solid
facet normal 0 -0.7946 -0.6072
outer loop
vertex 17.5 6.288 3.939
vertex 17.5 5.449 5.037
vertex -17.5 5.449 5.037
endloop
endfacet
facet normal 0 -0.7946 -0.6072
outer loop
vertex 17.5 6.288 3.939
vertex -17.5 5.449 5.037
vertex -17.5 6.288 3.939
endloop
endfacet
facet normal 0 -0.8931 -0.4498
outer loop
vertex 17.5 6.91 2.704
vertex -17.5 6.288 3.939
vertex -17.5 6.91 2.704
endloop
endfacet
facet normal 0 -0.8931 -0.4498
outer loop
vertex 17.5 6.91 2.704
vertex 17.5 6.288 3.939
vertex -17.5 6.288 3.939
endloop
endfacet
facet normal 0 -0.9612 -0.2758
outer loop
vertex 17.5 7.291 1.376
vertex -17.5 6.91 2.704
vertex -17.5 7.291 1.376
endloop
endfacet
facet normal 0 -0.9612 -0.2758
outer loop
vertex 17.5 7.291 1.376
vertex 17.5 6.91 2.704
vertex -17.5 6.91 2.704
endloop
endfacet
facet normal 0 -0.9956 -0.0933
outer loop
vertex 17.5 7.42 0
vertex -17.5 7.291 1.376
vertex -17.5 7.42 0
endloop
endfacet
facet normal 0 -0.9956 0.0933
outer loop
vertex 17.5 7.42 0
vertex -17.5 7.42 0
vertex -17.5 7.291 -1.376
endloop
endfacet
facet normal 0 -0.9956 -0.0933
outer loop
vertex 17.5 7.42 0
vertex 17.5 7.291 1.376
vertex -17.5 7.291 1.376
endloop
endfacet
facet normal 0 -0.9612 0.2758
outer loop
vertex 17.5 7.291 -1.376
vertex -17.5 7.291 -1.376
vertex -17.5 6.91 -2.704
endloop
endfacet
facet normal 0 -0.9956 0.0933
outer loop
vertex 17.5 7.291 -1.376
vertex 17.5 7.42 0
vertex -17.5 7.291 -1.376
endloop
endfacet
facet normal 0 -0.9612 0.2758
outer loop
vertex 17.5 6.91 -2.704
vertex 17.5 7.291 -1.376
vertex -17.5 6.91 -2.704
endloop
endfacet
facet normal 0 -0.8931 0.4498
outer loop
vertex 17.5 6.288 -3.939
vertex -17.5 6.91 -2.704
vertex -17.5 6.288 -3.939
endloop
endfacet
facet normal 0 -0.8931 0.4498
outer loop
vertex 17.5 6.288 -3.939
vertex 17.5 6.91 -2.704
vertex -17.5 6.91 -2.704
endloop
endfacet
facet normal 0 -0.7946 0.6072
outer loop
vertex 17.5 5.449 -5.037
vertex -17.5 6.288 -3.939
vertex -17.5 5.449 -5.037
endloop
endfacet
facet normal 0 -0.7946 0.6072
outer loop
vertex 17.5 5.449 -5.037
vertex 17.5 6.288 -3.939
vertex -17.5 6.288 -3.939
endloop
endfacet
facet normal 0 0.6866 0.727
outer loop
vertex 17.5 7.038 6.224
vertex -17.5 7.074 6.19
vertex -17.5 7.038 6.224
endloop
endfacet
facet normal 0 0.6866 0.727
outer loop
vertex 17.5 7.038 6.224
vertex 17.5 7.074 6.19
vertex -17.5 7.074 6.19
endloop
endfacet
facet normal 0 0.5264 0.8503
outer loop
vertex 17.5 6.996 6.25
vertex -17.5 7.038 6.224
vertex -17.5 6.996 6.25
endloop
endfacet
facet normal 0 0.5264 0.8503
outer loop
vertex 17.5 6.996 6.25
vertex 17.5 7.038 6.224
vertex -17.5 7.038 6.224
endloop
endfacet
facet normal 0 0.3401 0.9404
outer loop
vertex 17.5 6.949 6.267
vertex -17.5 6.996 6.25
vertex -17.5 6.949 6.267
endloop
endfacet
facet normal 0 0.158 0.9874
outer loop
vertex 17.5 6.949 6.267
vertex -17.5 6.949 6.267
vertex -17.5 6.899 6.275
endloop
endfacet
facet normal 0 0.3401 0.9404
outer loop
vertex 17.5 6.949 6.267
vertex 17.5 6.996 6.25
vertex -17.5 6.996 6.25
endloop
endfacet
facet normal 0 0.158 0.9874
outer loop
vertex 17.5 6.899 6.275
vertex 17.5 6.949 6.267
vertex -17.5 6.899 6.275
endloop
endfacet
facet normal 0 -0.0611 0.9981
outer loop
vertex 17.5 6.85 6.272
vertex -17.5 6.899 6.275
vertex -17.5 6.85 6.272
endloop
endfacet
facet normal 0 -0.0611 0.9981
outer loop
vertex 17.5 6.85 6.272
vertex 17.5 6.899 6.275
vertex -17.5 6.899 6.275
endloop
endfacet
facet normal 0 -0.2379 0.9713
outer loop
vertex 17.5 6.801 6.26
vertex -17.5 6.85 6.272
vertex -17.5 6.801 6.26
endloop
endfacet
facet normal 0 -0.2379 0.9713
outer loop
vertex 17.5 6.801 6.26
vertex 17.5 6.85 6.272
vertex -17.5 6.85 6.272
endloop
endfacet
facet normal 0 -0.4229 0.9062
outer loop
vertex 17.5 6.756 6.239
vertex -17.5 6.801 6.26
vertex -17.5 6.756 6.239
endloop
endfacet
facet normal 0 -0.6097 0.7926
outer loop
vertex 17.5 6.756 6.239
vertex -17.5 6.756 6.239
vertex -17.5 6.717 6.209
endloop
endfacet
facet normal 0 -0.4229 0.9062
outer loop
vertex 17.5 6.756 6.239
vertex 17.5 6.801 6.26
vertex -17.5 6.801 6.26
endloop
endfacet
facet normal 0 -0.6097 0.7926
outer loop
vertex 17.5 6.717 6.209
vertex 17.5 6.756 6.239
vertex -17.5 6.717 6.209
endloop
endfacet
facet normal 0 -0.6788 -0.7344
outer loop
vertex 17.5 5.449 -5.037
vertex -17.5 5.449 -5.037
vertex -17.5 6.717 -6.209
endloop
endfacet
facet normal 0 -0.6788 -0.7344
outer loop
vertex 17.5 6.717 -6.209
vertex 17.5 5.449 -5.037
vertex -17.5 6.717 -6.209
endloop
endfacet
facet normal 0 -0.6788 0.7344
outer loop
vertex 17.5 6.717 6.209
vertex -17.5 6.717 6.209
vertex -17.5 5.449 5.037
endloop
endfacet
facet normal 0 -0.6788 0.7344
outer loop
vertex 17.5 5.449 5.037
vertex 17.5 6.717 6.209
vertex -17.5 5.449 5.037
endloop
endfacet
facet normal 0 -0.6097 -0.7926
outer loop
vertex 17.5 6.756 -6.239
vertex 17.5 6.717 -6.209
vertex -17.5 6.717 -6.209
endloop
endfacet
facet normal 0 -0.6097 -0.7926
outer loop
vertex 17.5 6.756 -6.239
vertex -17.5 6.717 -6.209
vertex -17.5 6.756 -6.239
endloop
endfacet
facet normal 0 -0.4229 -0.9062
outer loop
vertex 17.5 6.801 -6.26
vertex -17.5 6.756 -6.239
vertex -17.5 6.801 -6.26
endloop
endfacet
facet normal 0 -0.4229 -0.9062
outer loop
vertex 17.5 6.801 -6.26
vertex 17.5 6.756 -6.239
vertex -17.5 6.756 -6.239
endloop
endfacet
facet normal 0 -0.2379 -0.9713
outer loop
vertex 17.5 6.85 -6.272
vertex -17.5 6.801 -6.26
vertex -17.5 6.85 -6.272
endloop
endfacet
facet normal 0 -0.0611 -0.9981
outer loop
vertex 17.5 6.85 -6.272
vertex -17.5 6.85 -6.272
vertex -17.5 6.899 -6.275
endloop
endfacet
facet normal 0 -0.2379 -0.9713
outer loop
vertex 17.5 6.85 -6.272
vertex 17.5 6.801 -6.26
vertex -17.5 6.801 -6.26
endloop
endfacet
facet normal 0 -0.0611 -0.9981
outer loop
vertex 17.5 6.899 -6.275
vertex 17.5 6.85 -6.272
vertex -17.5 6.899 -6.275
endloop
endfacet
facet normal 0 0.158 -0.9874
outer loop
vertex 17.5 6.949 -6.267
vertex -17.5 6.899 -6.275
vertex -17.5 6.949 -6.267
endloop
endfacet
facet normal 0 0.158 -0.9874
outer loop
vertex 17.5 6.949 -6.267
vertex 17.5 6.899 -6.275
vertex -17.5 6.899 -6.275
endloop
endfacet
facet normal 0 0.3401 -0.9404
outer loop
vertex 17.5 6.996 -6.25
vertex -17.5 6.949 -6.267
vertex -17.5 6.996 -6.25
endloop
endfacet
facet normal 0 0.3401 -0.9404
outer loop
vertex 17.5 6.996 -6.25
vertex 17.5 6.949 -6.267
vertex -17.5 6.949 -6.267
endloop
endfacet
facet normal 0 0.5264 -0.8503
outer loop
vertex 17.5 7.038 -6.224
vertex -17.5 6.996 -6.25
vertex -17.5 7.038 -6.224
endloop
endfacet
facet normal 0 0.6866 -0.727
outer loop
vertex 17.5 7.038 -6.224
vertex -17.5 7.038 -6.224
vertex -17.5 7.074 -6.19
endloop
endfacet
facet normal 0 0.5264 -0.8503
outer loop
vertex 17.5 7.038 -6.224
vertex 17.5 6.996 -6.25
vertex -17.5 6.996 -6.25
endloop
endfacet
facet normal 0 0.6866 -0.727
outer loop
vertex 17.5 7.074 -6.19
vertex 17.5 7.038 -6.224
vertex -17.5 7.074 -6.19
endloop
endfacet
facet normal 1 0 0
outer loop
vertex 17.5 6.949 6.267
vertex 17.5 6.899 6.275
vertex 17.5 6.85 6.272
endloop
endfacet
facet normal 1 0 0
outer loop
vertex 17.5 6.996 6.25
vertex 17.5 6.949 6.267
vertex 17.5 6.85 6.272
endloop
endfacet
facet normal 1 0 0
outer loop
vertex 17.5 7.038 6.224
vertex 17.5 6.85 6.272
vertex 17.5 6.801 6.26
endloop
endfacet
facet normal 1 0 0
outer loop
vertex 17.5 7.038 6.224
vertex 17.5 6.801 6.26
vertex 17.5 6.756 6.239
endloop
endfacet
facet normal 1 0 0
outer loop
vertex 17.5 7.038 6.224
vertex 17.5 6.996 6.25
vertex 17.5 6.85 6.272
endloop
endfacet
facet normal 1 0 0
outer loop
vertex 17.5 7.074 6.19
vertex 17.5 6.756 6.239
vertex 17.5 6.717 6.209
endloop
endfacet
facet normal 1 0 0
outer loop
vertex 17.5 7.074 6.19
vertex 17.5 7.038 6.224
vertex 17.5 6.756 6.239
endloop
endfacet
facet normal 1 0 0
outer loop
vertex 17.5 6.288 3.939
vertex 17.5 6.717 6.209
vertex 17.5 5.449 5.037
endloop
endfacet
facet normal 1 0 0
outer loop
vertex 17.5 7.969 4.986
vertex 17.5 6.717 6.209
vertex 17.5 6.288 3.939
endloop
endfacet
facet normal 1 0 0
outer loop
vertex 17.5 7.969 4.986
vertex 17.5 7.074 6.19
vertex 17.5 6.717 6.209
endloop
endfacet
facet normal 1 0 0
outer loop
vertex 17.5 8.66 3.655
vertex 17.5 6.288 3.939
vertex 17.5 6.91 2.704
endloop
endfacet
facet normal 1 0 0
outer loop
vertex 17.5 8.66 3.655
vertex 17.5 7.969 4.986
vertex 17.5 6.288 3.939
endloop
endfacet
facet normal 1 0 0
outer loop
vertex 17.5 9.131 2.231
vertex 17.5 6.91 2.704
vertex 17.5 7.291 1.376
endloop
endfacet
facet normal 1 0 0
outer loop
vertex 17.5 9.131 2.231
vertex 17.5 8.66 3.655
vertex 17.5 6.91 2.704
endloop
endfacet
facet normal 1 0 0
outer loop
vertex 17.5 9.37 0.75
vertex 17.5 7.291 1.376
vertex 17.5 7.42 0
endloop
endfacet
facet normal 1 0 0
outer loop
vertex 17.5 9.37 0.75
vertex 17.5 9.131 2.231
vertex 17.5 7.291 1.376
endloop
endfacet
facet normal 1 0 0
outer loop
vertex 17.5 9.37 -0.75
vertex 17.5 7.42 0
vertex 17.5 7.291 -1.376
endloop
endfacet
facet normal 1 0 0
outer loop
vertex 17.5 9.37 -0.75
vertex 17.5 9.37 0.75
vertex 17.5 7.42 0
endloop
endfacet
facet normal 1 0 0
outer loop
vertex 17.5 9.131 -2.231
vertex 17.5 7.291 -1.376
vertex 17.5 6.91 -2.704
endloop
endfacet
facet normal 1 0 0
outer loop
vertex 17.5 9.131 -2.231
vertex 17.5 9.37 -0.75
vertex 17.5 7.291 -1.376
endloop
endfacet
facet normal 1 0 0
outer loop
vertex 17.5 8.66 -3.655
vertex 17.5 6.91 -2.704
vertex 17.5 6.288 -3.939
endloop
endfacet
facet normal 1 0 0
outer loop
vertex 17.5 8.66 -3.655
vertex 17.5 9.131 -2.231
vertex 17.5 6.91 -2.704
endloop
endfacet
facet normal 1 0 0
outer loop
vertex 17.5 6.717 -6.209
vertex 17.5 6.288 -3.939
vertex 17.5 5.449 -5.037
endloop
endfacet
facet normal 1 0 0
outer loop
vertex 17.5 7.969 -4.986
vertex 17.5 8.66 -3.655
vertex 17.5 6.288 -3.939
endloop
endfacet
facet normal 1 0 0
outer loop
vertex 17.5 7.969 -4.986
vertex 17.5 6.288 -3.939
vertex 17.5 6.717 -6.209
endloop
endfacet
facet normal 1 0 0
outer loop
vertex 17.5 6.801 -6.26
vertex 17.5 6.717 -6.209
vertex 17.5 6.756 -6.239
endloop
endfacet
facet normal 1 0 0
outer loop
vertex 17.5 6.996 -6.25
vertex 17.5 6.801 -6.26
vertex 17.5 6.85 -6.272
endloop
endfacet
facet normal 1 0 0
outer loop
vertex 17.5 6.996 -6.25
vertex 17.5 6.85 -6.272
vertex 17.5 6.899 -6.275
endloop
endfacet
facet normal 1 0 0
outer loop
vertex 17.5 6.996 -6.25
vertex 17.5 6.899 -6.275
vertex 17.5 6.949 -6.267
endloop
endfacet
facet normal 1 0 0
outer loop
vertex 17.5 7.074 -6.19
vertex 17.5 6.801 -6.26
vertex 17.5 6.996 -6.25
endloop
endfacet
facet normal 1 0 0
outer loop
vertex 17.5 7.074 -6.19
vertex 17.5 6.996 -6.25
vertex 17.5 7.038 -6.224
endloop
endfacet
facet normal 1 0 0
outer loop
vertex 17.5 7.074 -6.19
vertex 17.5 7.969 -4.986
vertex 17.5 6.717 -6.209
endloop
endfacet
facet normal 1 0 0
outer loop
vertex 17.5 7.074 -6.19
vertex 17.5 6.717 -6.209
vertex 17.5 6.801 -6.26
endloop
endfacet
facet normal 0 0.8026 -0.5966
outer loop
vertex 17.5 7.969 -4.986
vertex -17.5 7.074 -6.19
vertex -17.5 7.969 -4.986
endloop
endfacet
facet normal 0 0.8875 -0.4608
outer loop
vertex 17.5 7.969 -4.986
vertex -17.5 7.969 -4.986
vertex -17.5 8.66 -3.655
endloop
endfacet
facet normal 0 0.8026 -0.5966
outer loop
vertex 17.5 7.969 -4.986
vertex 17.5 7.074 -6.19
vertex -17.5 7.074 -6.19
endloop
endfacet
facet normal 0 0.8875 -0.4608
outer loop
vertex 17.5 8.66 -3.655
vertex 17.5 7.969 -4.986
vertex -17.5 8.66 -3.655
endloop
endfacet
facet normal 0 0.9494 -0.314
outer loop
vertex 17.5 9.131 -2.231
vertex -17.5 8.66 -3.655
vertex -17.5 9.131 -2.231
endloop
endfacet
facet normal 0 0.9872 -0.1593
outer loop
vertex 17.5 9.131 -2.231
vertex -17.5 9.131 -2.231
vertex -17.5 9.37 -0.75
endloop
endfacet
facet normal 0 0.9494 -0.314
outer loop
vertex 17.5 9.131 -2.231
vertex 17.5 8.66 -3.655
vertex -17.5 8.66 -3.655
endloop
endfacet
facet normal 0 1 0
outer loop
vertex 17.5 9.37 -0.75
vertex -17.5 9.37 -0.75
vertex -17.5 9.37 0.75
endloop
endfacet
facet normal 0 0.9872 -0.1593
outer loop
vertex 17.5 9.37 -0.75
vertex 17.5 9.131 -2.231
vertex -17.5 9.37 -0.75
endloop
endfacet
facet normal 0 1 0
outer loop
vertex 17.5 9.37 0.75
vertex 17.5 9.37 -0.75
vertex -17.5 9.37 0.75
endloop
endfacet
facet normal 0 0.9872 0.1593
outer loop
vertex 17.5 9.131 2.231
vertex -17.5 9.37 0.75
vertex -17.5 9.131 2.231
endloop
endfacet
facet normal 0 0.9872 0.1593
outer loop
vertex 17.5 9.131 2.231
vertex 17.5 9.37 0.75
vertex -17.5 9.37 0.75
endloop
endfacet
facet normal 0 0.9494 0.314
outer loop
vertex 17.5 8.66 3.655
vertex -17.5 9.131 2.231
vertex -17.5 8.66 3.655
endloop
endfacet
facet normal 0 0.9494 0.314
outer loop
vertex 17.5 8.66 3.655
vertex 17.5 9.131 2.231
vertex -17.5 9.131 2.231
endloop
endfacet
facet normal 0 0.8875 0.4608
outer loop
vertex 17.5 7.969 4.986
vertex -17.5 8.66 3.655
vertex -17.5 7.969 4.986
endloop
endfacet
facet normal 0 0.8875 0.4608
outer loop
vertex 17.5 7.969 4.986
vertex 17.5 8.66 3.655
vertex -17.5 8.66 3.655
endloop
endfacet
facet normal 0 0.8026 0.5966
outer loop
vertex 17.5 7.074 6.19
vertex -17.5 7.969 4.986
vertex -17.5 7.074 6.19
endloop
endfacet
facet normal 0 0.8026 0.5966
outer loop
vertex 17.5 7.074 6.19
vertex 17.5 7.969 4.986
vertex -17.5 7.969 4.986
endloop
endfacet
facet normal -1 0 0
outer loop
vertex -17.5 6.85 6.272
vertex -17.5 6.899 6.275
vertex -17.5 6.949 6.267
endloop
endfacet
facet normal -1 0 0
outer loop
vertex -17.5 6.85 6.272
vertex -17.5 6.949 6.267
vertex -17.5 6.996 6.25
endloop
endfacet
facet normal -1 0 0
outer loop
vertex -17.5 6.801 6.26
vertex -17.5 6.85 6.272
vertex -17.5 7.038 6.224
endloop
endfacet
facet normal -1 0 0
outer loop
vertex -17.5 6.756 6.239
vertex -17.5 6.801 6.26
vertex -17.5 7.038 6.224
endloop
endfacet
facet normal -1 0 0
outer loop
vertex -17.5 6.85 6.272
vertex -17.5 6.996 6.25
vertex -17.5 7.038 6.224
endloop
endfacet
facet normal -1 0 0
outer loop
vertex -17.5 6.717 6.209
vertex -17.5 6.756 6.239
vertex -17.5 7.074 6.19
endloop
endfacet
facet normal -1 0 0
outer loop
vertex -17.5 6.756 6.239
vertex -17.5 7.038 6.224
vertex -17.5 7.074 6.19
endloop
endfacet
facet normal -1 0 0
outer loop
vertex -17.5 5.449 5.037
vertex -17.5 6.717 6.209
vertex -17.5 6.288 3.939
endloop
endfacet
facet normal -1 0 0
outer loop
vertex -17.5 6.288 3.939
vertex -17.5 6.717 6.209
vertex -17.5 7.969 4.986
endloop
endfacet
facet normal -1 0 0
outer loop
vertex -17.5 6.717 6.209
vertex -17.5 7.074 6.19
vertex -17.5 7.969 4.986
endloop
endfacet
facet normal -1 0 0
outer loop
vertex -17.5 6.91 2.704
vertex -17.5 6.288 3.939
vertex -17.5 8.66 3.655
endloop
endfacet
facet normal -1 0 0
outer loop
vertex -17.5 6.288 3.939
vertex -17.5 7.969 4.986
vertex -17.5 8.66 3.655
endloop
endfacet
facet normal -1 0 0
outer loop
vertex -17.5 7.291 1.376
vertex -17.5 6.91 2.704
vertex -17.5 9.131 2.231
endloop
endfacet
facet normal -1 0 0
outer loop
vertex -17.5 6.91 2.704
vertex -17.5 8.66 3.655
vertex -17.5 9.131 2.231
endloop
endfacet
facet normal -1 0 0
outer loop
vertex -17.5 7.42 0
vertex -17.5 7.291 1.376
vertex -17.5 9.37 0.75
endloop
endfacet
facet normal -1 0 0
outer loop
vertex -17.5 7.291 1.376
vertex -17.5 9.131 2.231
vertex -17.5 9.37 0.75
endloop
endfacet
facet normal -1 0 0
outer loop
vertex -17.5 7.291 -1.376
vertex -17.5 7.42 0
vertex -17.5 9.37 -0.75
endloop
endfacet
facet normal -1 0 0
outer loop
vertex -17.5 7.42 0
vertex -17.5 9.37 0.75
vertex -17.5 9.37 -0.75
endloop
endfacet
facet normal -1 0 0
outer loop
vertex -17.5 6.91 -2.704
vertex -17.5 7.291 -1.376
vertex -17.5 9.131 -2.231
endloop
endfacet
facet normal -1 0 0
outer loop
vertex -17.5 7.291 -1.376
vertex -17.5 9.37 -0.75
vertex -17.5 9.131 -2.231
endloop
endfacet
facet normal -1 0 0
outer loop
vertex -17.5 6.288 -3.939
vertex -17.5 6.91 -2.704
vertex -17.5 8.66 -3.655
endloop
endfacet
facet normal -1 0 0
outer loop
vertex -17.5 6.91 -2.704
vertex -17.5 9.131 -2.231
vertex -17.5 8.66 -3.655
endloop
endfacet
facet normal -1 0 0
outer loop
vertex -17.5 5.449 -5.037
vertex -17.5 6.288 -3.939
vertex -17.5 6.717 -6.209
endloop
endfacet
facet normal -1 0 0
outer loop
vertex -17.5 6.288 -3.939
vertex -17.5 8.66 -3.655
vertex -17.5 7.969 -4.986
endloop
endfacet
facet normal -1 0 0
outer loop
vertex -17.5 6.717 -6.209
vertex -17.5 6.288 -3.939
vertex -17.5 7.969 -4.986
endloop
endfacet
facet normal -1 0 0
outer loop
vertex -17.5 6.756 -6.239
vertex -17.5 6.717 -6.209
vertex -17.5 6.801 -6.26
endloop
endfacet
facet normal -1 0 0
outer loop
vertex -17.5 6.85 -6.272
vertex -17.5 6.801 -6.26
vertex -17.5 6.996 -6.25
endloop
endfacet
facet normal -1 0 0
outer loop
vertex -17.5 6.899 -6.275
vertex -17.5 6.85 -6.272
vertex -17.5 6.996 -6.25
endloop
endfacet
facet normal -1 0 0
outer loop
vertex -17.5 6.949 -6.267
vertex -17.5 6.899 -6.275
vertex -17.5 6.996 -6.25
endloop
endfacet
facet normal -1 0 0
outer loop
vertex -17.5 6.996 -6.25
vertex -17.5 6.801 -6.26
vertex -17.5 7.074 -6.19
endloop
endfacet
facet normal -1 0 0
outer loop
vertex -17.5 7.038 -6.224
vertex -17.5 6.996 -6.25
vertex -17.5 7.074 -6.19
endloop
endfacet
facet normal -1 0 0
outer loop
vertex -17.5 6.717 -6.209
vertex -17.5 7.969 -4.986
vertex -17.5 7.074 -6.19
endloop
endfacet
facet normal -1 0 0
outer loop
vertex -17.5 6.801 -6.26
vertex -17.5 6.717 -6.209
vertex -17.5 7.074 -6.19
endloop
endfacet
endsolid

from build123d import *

# Parameters (mm, degrees)
BOSS_EXTRUDE1_DEPTH = 17.5


with BuildPart() as part:
    # Sketch1 → Boss-Extrude1 (new, symmetric)
    with BuildSketch(Plane(origin=(0, 0, 0), x_dir=(0, 0, -1), z_dir=(1, 0, 0))):
        with BuildLine():
            Line((-6.20870808, 6.716542561), (-5.036701532, 5.44867302))
            ThreePointArc((-5.036701532, 5.44867302), (0, 7.42), (5.036701532, 5.44867302))
            Line((5.036701532, 5.44867302), (6.20870808, 6.716542561))
            ThreePointArc((6.20870808, 6.716542561), (6.274777299, 6.899469771), (6.189748422, 7.074391456))
            ThreePointArc((6.189748422, 7.074391456), (0, 9.4), (-6.189748422, 7.074391456))
            ThreePointArc((-6.189748422, 7.074391456), (-6.274777299, 6.899469771), (-6.20870808, 6.716542561))
        make_face()
    extrude(amount=BOSS_EXTRUDE1_DEPTH, both=True)


solid = part.part
